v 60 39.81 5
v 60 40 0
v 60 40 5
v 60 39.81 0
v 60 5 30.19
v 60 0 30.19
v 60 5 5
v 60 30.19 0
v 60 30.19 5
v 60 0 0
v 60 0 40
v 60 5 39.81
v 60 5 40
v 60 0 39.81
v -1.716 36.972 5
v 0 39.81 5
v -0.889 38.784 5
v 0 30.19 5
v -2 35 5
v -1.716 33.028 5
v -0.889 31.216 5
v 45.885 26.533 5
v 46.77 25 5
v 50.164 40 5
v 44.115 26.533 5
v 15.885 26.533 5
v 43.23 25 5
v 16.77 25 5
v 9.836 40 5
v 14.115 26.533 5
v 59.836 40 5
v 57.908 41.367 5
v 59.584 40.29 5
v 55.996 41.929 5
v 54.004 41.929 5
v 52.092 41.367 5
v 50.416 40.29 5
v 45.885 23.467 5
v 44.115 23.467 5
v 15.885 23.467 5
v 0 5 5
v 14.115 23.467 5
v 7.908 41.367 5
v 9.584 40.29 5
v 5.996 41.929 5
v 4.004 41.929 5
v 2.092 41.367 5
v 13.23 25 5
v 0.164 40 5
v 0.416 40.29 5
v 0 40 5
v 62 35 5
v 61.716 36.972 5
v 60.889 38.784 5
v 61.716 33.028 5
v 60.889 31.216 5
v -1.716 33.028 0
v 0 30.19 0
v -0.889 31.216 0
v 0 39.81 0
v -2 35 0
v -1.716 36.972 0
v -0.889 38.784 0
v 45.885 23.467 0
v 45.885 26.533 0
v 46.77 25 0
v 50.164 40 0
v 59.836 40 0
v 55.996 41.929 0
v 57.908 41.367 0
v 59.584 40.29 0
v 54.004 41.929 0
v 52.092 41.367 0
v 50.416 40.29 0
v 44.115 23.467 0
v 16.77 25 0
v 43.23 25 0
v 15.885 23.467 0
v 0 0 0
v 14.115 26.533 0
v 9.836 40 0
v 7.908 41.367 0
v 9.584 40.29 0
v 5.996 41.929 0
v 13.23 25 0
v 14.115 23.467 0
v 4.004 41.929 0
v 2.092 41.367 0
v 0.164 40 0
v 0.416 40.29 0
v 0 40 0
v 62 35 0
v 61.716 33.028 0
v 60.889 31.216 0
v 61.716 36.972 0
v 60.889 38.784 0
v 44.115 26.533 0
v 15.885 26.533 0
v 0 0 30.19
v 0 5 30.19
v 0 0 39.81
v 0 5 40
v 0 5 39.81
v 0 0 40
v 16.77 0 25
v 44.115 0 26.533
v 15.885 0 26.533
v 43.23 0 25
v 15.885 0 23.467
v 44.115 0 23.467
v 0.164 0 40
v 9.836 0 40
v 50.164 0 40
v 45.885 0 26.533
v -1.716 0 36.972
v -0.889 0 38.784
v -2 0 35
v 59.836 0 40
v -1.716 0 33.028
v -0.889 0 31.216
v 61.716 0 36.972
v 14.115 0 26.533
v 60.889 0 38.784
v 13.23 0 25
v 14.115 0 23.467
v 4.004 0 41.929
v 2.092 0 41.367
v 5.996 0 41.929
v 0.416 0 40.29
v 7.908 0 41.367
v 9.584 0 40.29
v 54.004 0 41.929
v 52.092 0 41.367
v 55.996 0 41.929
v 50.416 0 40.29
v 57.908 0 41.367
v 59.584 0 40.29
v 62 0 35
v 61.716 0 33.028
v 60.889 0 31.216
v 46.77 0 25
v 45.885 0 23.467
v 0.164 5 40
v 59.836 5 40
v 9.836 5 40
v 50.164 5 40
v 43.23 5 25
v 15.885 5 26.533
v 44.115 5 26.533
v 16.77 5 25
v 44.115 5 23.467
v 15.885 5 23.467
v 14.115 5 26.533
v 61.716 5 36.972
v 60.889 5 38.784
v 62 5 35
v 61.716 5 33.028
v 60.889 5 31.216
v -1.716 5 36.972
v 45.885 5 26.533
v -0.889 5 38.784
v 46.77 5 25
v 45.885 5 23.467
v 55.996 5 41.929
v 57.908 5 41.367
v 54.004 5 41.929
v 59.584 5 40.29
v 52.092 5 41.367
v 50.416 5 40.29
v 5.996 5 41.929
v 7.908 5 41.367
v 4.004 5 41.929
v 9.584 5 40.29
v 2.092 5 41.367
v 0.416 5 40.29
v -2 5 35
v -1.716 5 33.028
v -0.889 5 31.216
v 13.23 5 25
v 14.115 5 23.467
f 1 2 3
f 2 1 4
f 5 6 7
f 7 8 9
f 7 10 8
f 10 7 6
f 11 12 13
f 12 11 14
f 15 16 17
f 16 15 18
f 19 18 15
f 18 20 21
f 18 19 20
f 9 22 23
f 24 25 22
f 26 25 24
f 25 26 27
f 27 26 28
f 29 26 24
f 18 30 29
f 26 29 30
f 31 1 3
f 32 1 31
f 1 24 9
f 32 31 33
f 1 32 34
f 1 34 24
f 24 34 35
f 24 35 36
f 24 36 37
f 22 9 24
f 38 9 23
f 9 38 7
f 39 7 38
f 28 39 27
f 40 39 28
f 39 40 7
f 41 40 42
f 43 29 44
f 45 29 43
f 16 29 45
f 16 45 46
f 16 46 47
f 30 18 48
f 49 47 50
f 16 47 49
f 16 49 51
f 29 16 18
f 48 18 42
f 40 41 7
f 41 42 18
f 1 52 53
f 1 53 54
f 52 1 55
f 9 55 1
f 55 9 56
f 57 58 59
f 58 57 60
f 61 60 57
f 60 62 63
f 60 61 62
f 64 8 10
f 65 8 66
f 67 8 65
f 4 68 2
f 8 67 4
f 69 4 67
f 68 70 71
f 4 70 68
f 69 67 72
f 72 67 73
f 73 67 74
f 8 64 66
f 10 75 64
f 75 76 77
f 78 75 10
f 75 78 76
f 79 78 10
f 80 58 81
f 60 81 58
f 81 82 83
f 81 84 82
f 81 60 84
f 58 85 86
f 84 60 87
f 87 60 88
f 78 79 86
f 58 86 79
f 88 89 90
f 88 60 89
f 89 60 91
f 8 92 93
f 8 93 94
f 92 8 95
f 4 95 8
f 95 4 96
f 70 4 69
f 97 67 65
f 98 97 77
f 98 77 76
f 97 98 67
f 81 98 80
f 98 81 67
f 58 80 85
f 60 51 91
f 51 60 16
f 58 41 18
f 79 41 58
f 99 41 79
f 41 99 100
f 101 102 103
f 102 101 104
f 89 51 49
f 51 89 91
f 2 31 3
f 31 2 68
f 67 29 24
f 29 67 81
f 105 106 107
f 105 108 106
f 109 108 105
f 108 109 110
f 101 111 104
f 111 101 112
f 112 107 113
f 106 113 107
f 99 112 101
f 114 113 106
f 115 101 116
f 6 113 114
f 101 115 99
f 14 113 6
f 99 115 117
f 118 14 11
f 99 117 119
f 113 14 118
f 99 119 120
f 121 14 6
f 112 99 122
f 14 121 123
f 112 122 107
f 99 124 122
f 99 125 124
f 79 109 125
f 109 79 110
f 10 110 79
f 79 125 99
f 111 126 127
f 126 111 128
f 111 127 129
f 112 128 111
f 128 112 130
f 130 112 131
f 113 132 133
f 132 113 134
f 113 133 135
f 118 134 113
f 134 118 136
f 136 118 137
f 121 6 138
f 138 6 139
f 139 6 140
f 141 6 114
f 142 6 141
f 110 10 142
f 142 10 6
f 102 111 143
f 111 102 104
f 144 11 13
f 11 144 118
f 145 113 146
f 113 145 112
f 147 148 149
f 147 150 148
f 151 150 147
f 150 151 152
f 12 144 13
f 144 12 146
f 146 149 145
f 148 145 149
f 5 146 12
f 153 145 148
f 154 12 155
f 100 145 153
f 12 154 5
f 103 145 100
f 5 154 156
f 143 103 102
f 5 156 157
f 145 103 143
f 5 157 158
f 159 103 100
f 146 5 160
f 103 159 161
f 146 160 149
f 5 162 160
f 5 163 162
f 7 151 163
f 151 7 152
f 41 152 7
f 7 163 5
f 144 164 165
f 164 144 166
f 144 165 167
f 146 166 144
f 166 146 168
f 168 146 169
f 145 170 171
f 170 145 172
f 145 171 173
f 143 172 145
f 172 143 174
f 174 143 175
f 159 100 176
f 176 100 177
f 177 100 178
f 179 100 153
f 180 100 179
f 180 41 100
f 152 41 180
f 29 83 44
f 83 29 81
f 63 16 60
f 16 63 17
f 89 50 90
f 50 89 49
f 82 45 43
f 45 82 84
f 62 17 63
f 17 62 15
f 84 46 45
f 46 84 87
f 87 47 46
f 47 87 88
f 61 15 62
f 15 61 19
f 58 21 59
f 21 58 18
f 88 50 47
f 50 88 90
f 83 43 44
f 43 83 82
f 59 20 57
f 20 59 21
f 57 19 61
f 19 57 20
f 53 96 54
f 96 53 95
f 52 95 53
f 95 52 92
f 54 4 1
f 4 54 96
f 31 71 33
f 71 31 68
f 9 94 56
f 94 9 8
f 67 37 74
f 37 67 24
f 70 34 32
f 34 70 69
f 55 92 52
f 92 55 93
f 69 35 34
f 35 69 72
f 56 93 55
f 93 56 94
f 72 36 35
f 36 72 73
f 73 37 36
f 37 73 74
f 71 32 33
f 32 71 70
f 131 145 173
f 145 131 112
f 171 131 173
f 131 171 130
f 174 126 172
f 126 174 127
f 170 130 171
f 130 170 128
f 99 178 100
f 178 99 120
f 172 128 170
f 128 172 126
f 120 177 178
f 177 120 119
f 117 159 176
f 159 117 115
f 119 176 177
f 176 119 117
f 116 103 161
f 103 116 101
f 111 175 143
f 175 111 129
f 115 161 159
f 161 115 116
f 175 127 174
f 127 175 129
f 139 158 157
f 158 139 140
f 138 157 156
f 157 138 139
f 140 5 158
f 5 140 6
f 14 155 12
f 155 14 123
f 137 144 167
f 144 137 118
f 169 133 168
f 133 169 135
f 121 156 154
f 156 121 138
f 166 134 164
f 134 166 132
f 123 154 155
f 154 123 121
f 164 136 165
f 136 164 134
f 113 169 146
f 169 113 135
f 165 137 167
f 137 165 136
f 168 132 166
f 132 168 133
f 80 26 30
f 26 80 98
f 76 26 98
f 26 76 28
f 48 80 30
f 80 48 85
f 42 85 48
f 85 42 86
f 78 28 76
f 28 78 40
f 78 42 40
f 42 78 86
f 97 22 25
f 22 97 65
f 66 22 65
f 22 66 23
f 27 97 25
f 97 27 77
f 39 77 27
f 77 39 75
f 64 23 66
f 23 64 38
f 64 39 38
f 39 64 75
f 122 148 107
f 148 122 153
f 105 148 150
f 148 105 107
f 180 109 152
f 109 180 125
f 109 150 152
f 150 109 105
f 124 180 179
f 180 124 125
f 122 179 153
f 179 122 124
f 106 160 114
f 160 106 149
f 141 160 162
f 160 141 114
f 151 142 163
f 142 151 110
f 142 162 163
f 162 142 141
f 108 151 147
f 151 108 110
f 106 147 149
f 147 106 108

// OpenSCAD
difference()
{
	union()
	{
		cube([60,40,5]);
		cube([60,5,40]);

	translate ([5,35,0]) cylinder (h = 5, r=7);
	translate ([55,35,0]) cylinder (h = 5, r=7);
	translate ([5,0,35]) rotate([270,0,0]) cylinder (h = 5, r=7);	
	translate ([55,0,35]) rotate([270,0,0]) cylinder (h = 5, r=7);	

	}
	
	translate ([15,25,-1]) cylinder (h = 7, r=1.77);
	translate ([45,25,-1]) cylinder (h = 7, r=1.77);
	translate ([15,-1,25]) rotate([270,0,0]) cylinder (h = 7, r=1.77);	
	translate ([45,-1,25]) rotate([270,0,0]) cylinder (h = 7, r=1.77);	
	
	
}

 
